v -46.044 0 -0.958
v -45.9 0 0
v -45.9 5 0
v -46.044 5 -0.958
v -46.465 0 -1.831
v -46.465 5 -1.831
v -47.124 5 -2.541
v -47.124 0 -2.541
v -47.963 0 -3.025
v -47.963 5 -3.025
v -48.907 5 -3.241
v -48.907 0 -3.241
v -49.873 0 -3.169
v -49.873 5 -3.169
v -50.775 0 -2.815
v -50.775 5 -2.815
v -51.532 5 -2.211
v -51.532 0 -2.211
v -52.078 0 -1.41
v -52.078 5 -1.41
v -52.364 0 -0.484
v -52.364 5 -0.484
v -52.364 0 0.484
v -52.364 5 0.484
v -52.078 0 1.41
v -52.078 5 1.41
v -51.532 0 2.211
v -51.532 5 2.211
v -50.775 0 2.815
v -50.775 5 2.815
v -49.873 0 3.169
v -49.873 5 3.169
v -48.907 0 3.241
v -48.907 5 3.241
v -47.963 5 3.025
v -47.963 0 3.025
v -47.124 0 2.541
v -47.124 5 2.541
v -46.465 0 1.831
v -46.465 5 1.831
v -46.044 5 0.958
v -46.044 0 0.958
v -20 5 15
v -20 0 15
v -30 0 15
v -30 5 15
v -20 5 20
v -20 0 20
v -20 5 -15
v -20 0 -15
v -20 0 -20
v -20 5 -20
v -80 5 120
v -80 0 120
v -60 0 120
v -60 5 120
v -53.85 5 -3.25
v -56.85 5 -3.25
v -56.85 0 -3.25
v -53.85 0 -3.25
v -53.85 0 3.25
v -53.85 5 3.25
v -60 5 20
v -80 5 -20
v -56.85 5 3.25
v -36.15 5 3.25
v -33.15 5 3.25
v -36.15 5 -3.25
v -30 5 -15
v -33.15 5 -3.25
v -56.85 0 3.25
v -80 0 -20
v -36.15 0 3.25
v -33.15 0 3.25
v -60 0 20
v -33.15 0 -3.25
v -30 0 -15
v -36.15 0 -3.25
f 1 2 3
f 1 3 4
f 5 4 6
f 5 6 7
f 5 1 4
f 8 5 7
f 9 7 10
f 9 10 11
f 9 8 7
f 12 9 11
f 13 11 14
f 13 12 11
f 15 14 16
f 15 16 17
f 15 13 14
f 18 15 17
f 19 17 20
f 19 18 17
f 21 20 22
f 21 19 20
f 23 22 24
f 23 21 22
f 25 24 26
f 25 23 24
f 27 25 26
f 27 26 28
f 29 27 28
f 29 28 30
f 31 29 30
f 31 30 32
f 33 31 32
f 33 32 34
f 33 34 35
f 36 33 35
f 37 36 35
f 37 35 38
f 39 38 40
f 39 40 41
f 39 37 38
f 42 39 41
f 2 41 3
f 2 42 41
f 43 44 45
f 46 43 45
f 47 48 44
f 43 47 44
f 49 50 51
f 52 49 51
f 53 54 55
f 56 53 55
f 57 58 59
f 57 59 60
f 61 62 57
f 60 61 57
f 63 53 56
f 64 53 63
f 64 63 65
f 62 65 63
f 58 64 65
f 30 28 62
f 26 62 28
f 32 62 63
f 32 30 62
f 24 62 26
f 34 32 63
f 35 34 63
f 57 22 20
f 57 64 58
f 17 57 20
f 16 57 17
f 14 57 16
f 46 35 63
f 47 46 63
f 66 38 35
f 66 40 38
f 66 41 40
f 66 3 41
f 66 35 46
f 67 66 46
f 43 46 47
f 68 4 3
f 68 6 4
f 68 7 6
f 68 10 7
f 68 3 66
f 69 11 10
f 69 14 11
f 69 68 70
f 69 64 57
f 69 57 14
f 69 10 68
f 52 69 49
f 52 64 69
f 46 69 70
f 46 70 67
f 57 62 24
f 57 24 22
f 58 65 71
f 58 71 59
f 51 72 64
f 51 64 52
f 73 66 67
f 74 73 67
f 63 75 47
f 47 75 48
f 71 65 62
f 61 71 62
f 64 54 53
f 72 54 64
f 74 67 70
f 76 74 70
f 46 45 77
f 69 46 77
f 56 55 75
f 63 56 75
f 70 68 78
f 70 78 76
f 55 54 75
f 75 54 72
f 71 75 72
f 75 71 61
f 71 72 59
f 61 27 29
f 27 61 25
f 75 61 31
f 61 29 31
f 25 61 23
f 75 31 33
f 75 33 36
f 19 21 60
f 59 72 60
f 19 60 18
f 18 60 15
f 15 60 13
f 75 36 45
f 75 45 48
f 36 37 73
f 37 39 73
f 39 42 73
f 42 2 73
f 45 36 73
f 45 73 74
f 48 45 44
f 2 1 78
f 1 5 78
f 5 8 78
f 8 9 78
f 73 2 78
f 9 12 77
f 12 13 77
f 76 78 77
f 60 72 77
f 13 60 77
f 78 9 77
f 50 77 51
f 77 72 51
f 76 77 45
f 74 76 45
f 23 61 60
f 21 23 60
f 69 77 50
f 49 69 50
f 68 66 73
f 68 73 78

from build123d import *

# Parameters (mm, degrees)
SKETCH1_R               = 3.25
BOSS_EXTRUDE1_DEPTH     = 5
SKETCH3_W               = 20
SKETCH3_H               = 140
BOSS_EXTRUDE2_DEPTH     = 5
SKETCH4_W               = 3
SKETCH4_H               = 6.5
CUT_EXTRUDE1_DEPTH      = 1
CUT_EXTRUDE1_DEPTH_BACK = 6


with BuildPart() as part:
    # Sketch1 → Boss-Extrude1 (new body)
    with BuildSketch(Plane(origin=(0, 0, 0), x_dir=(1, 0, 0), z_dir=(0, 1, 0))):
        Polygon((-20, -15), (-30, -15), (-30, 15), (-20, 15), (-20, 20), (-60, 20), (-60, -20), (-20, -20), align=None)
        with Locations((-49.15, 0)):
            Circle(SKETCH1_R, mode=Mode.SUBTRACT)
    extrude(amount=BOSS_EXTRUDE1_DEPTH)

    # Sketch3 → Boss-Extrude2 (add)
    with BuildSketch(Plane(origin=(0, 0, 0), x_dir=(1, 0, 0), z_dir=(0, 1, 0))):
        with Locations((-70, -50)):
            Rectangle(SKETCH3_W, SKETCH3_H)
    extrude(amount=BOSS_EXTRUDE2_DEPTH)

    # Sketch4 → Cut-Extrude1 (cut, two sides)
    with BuildSketch(Plane(origin=(0, 5, 0), x_dir=(1, 0, 0), z_dir=(0, 1, 0))) as cut_extrude1_sk:
        with Locations((-34.65, 0)):
            Rectangle(SKETCH4_W, SKETCH4_H)
        with Locations((-55.35, 0)):
            Rectangle(SKETCH4_W, SKETCH4_H)
    extrude(amount=CUT_EXTRUDE1_DEPTH, mode=Mode.SUBTRACT)
    extrude(cut_extrude1_sk.sketch, amount=-CUT_EXTRUDE1_DEPTH_BACK, mode=Mode.SUBTRACT)


solid = part.part
